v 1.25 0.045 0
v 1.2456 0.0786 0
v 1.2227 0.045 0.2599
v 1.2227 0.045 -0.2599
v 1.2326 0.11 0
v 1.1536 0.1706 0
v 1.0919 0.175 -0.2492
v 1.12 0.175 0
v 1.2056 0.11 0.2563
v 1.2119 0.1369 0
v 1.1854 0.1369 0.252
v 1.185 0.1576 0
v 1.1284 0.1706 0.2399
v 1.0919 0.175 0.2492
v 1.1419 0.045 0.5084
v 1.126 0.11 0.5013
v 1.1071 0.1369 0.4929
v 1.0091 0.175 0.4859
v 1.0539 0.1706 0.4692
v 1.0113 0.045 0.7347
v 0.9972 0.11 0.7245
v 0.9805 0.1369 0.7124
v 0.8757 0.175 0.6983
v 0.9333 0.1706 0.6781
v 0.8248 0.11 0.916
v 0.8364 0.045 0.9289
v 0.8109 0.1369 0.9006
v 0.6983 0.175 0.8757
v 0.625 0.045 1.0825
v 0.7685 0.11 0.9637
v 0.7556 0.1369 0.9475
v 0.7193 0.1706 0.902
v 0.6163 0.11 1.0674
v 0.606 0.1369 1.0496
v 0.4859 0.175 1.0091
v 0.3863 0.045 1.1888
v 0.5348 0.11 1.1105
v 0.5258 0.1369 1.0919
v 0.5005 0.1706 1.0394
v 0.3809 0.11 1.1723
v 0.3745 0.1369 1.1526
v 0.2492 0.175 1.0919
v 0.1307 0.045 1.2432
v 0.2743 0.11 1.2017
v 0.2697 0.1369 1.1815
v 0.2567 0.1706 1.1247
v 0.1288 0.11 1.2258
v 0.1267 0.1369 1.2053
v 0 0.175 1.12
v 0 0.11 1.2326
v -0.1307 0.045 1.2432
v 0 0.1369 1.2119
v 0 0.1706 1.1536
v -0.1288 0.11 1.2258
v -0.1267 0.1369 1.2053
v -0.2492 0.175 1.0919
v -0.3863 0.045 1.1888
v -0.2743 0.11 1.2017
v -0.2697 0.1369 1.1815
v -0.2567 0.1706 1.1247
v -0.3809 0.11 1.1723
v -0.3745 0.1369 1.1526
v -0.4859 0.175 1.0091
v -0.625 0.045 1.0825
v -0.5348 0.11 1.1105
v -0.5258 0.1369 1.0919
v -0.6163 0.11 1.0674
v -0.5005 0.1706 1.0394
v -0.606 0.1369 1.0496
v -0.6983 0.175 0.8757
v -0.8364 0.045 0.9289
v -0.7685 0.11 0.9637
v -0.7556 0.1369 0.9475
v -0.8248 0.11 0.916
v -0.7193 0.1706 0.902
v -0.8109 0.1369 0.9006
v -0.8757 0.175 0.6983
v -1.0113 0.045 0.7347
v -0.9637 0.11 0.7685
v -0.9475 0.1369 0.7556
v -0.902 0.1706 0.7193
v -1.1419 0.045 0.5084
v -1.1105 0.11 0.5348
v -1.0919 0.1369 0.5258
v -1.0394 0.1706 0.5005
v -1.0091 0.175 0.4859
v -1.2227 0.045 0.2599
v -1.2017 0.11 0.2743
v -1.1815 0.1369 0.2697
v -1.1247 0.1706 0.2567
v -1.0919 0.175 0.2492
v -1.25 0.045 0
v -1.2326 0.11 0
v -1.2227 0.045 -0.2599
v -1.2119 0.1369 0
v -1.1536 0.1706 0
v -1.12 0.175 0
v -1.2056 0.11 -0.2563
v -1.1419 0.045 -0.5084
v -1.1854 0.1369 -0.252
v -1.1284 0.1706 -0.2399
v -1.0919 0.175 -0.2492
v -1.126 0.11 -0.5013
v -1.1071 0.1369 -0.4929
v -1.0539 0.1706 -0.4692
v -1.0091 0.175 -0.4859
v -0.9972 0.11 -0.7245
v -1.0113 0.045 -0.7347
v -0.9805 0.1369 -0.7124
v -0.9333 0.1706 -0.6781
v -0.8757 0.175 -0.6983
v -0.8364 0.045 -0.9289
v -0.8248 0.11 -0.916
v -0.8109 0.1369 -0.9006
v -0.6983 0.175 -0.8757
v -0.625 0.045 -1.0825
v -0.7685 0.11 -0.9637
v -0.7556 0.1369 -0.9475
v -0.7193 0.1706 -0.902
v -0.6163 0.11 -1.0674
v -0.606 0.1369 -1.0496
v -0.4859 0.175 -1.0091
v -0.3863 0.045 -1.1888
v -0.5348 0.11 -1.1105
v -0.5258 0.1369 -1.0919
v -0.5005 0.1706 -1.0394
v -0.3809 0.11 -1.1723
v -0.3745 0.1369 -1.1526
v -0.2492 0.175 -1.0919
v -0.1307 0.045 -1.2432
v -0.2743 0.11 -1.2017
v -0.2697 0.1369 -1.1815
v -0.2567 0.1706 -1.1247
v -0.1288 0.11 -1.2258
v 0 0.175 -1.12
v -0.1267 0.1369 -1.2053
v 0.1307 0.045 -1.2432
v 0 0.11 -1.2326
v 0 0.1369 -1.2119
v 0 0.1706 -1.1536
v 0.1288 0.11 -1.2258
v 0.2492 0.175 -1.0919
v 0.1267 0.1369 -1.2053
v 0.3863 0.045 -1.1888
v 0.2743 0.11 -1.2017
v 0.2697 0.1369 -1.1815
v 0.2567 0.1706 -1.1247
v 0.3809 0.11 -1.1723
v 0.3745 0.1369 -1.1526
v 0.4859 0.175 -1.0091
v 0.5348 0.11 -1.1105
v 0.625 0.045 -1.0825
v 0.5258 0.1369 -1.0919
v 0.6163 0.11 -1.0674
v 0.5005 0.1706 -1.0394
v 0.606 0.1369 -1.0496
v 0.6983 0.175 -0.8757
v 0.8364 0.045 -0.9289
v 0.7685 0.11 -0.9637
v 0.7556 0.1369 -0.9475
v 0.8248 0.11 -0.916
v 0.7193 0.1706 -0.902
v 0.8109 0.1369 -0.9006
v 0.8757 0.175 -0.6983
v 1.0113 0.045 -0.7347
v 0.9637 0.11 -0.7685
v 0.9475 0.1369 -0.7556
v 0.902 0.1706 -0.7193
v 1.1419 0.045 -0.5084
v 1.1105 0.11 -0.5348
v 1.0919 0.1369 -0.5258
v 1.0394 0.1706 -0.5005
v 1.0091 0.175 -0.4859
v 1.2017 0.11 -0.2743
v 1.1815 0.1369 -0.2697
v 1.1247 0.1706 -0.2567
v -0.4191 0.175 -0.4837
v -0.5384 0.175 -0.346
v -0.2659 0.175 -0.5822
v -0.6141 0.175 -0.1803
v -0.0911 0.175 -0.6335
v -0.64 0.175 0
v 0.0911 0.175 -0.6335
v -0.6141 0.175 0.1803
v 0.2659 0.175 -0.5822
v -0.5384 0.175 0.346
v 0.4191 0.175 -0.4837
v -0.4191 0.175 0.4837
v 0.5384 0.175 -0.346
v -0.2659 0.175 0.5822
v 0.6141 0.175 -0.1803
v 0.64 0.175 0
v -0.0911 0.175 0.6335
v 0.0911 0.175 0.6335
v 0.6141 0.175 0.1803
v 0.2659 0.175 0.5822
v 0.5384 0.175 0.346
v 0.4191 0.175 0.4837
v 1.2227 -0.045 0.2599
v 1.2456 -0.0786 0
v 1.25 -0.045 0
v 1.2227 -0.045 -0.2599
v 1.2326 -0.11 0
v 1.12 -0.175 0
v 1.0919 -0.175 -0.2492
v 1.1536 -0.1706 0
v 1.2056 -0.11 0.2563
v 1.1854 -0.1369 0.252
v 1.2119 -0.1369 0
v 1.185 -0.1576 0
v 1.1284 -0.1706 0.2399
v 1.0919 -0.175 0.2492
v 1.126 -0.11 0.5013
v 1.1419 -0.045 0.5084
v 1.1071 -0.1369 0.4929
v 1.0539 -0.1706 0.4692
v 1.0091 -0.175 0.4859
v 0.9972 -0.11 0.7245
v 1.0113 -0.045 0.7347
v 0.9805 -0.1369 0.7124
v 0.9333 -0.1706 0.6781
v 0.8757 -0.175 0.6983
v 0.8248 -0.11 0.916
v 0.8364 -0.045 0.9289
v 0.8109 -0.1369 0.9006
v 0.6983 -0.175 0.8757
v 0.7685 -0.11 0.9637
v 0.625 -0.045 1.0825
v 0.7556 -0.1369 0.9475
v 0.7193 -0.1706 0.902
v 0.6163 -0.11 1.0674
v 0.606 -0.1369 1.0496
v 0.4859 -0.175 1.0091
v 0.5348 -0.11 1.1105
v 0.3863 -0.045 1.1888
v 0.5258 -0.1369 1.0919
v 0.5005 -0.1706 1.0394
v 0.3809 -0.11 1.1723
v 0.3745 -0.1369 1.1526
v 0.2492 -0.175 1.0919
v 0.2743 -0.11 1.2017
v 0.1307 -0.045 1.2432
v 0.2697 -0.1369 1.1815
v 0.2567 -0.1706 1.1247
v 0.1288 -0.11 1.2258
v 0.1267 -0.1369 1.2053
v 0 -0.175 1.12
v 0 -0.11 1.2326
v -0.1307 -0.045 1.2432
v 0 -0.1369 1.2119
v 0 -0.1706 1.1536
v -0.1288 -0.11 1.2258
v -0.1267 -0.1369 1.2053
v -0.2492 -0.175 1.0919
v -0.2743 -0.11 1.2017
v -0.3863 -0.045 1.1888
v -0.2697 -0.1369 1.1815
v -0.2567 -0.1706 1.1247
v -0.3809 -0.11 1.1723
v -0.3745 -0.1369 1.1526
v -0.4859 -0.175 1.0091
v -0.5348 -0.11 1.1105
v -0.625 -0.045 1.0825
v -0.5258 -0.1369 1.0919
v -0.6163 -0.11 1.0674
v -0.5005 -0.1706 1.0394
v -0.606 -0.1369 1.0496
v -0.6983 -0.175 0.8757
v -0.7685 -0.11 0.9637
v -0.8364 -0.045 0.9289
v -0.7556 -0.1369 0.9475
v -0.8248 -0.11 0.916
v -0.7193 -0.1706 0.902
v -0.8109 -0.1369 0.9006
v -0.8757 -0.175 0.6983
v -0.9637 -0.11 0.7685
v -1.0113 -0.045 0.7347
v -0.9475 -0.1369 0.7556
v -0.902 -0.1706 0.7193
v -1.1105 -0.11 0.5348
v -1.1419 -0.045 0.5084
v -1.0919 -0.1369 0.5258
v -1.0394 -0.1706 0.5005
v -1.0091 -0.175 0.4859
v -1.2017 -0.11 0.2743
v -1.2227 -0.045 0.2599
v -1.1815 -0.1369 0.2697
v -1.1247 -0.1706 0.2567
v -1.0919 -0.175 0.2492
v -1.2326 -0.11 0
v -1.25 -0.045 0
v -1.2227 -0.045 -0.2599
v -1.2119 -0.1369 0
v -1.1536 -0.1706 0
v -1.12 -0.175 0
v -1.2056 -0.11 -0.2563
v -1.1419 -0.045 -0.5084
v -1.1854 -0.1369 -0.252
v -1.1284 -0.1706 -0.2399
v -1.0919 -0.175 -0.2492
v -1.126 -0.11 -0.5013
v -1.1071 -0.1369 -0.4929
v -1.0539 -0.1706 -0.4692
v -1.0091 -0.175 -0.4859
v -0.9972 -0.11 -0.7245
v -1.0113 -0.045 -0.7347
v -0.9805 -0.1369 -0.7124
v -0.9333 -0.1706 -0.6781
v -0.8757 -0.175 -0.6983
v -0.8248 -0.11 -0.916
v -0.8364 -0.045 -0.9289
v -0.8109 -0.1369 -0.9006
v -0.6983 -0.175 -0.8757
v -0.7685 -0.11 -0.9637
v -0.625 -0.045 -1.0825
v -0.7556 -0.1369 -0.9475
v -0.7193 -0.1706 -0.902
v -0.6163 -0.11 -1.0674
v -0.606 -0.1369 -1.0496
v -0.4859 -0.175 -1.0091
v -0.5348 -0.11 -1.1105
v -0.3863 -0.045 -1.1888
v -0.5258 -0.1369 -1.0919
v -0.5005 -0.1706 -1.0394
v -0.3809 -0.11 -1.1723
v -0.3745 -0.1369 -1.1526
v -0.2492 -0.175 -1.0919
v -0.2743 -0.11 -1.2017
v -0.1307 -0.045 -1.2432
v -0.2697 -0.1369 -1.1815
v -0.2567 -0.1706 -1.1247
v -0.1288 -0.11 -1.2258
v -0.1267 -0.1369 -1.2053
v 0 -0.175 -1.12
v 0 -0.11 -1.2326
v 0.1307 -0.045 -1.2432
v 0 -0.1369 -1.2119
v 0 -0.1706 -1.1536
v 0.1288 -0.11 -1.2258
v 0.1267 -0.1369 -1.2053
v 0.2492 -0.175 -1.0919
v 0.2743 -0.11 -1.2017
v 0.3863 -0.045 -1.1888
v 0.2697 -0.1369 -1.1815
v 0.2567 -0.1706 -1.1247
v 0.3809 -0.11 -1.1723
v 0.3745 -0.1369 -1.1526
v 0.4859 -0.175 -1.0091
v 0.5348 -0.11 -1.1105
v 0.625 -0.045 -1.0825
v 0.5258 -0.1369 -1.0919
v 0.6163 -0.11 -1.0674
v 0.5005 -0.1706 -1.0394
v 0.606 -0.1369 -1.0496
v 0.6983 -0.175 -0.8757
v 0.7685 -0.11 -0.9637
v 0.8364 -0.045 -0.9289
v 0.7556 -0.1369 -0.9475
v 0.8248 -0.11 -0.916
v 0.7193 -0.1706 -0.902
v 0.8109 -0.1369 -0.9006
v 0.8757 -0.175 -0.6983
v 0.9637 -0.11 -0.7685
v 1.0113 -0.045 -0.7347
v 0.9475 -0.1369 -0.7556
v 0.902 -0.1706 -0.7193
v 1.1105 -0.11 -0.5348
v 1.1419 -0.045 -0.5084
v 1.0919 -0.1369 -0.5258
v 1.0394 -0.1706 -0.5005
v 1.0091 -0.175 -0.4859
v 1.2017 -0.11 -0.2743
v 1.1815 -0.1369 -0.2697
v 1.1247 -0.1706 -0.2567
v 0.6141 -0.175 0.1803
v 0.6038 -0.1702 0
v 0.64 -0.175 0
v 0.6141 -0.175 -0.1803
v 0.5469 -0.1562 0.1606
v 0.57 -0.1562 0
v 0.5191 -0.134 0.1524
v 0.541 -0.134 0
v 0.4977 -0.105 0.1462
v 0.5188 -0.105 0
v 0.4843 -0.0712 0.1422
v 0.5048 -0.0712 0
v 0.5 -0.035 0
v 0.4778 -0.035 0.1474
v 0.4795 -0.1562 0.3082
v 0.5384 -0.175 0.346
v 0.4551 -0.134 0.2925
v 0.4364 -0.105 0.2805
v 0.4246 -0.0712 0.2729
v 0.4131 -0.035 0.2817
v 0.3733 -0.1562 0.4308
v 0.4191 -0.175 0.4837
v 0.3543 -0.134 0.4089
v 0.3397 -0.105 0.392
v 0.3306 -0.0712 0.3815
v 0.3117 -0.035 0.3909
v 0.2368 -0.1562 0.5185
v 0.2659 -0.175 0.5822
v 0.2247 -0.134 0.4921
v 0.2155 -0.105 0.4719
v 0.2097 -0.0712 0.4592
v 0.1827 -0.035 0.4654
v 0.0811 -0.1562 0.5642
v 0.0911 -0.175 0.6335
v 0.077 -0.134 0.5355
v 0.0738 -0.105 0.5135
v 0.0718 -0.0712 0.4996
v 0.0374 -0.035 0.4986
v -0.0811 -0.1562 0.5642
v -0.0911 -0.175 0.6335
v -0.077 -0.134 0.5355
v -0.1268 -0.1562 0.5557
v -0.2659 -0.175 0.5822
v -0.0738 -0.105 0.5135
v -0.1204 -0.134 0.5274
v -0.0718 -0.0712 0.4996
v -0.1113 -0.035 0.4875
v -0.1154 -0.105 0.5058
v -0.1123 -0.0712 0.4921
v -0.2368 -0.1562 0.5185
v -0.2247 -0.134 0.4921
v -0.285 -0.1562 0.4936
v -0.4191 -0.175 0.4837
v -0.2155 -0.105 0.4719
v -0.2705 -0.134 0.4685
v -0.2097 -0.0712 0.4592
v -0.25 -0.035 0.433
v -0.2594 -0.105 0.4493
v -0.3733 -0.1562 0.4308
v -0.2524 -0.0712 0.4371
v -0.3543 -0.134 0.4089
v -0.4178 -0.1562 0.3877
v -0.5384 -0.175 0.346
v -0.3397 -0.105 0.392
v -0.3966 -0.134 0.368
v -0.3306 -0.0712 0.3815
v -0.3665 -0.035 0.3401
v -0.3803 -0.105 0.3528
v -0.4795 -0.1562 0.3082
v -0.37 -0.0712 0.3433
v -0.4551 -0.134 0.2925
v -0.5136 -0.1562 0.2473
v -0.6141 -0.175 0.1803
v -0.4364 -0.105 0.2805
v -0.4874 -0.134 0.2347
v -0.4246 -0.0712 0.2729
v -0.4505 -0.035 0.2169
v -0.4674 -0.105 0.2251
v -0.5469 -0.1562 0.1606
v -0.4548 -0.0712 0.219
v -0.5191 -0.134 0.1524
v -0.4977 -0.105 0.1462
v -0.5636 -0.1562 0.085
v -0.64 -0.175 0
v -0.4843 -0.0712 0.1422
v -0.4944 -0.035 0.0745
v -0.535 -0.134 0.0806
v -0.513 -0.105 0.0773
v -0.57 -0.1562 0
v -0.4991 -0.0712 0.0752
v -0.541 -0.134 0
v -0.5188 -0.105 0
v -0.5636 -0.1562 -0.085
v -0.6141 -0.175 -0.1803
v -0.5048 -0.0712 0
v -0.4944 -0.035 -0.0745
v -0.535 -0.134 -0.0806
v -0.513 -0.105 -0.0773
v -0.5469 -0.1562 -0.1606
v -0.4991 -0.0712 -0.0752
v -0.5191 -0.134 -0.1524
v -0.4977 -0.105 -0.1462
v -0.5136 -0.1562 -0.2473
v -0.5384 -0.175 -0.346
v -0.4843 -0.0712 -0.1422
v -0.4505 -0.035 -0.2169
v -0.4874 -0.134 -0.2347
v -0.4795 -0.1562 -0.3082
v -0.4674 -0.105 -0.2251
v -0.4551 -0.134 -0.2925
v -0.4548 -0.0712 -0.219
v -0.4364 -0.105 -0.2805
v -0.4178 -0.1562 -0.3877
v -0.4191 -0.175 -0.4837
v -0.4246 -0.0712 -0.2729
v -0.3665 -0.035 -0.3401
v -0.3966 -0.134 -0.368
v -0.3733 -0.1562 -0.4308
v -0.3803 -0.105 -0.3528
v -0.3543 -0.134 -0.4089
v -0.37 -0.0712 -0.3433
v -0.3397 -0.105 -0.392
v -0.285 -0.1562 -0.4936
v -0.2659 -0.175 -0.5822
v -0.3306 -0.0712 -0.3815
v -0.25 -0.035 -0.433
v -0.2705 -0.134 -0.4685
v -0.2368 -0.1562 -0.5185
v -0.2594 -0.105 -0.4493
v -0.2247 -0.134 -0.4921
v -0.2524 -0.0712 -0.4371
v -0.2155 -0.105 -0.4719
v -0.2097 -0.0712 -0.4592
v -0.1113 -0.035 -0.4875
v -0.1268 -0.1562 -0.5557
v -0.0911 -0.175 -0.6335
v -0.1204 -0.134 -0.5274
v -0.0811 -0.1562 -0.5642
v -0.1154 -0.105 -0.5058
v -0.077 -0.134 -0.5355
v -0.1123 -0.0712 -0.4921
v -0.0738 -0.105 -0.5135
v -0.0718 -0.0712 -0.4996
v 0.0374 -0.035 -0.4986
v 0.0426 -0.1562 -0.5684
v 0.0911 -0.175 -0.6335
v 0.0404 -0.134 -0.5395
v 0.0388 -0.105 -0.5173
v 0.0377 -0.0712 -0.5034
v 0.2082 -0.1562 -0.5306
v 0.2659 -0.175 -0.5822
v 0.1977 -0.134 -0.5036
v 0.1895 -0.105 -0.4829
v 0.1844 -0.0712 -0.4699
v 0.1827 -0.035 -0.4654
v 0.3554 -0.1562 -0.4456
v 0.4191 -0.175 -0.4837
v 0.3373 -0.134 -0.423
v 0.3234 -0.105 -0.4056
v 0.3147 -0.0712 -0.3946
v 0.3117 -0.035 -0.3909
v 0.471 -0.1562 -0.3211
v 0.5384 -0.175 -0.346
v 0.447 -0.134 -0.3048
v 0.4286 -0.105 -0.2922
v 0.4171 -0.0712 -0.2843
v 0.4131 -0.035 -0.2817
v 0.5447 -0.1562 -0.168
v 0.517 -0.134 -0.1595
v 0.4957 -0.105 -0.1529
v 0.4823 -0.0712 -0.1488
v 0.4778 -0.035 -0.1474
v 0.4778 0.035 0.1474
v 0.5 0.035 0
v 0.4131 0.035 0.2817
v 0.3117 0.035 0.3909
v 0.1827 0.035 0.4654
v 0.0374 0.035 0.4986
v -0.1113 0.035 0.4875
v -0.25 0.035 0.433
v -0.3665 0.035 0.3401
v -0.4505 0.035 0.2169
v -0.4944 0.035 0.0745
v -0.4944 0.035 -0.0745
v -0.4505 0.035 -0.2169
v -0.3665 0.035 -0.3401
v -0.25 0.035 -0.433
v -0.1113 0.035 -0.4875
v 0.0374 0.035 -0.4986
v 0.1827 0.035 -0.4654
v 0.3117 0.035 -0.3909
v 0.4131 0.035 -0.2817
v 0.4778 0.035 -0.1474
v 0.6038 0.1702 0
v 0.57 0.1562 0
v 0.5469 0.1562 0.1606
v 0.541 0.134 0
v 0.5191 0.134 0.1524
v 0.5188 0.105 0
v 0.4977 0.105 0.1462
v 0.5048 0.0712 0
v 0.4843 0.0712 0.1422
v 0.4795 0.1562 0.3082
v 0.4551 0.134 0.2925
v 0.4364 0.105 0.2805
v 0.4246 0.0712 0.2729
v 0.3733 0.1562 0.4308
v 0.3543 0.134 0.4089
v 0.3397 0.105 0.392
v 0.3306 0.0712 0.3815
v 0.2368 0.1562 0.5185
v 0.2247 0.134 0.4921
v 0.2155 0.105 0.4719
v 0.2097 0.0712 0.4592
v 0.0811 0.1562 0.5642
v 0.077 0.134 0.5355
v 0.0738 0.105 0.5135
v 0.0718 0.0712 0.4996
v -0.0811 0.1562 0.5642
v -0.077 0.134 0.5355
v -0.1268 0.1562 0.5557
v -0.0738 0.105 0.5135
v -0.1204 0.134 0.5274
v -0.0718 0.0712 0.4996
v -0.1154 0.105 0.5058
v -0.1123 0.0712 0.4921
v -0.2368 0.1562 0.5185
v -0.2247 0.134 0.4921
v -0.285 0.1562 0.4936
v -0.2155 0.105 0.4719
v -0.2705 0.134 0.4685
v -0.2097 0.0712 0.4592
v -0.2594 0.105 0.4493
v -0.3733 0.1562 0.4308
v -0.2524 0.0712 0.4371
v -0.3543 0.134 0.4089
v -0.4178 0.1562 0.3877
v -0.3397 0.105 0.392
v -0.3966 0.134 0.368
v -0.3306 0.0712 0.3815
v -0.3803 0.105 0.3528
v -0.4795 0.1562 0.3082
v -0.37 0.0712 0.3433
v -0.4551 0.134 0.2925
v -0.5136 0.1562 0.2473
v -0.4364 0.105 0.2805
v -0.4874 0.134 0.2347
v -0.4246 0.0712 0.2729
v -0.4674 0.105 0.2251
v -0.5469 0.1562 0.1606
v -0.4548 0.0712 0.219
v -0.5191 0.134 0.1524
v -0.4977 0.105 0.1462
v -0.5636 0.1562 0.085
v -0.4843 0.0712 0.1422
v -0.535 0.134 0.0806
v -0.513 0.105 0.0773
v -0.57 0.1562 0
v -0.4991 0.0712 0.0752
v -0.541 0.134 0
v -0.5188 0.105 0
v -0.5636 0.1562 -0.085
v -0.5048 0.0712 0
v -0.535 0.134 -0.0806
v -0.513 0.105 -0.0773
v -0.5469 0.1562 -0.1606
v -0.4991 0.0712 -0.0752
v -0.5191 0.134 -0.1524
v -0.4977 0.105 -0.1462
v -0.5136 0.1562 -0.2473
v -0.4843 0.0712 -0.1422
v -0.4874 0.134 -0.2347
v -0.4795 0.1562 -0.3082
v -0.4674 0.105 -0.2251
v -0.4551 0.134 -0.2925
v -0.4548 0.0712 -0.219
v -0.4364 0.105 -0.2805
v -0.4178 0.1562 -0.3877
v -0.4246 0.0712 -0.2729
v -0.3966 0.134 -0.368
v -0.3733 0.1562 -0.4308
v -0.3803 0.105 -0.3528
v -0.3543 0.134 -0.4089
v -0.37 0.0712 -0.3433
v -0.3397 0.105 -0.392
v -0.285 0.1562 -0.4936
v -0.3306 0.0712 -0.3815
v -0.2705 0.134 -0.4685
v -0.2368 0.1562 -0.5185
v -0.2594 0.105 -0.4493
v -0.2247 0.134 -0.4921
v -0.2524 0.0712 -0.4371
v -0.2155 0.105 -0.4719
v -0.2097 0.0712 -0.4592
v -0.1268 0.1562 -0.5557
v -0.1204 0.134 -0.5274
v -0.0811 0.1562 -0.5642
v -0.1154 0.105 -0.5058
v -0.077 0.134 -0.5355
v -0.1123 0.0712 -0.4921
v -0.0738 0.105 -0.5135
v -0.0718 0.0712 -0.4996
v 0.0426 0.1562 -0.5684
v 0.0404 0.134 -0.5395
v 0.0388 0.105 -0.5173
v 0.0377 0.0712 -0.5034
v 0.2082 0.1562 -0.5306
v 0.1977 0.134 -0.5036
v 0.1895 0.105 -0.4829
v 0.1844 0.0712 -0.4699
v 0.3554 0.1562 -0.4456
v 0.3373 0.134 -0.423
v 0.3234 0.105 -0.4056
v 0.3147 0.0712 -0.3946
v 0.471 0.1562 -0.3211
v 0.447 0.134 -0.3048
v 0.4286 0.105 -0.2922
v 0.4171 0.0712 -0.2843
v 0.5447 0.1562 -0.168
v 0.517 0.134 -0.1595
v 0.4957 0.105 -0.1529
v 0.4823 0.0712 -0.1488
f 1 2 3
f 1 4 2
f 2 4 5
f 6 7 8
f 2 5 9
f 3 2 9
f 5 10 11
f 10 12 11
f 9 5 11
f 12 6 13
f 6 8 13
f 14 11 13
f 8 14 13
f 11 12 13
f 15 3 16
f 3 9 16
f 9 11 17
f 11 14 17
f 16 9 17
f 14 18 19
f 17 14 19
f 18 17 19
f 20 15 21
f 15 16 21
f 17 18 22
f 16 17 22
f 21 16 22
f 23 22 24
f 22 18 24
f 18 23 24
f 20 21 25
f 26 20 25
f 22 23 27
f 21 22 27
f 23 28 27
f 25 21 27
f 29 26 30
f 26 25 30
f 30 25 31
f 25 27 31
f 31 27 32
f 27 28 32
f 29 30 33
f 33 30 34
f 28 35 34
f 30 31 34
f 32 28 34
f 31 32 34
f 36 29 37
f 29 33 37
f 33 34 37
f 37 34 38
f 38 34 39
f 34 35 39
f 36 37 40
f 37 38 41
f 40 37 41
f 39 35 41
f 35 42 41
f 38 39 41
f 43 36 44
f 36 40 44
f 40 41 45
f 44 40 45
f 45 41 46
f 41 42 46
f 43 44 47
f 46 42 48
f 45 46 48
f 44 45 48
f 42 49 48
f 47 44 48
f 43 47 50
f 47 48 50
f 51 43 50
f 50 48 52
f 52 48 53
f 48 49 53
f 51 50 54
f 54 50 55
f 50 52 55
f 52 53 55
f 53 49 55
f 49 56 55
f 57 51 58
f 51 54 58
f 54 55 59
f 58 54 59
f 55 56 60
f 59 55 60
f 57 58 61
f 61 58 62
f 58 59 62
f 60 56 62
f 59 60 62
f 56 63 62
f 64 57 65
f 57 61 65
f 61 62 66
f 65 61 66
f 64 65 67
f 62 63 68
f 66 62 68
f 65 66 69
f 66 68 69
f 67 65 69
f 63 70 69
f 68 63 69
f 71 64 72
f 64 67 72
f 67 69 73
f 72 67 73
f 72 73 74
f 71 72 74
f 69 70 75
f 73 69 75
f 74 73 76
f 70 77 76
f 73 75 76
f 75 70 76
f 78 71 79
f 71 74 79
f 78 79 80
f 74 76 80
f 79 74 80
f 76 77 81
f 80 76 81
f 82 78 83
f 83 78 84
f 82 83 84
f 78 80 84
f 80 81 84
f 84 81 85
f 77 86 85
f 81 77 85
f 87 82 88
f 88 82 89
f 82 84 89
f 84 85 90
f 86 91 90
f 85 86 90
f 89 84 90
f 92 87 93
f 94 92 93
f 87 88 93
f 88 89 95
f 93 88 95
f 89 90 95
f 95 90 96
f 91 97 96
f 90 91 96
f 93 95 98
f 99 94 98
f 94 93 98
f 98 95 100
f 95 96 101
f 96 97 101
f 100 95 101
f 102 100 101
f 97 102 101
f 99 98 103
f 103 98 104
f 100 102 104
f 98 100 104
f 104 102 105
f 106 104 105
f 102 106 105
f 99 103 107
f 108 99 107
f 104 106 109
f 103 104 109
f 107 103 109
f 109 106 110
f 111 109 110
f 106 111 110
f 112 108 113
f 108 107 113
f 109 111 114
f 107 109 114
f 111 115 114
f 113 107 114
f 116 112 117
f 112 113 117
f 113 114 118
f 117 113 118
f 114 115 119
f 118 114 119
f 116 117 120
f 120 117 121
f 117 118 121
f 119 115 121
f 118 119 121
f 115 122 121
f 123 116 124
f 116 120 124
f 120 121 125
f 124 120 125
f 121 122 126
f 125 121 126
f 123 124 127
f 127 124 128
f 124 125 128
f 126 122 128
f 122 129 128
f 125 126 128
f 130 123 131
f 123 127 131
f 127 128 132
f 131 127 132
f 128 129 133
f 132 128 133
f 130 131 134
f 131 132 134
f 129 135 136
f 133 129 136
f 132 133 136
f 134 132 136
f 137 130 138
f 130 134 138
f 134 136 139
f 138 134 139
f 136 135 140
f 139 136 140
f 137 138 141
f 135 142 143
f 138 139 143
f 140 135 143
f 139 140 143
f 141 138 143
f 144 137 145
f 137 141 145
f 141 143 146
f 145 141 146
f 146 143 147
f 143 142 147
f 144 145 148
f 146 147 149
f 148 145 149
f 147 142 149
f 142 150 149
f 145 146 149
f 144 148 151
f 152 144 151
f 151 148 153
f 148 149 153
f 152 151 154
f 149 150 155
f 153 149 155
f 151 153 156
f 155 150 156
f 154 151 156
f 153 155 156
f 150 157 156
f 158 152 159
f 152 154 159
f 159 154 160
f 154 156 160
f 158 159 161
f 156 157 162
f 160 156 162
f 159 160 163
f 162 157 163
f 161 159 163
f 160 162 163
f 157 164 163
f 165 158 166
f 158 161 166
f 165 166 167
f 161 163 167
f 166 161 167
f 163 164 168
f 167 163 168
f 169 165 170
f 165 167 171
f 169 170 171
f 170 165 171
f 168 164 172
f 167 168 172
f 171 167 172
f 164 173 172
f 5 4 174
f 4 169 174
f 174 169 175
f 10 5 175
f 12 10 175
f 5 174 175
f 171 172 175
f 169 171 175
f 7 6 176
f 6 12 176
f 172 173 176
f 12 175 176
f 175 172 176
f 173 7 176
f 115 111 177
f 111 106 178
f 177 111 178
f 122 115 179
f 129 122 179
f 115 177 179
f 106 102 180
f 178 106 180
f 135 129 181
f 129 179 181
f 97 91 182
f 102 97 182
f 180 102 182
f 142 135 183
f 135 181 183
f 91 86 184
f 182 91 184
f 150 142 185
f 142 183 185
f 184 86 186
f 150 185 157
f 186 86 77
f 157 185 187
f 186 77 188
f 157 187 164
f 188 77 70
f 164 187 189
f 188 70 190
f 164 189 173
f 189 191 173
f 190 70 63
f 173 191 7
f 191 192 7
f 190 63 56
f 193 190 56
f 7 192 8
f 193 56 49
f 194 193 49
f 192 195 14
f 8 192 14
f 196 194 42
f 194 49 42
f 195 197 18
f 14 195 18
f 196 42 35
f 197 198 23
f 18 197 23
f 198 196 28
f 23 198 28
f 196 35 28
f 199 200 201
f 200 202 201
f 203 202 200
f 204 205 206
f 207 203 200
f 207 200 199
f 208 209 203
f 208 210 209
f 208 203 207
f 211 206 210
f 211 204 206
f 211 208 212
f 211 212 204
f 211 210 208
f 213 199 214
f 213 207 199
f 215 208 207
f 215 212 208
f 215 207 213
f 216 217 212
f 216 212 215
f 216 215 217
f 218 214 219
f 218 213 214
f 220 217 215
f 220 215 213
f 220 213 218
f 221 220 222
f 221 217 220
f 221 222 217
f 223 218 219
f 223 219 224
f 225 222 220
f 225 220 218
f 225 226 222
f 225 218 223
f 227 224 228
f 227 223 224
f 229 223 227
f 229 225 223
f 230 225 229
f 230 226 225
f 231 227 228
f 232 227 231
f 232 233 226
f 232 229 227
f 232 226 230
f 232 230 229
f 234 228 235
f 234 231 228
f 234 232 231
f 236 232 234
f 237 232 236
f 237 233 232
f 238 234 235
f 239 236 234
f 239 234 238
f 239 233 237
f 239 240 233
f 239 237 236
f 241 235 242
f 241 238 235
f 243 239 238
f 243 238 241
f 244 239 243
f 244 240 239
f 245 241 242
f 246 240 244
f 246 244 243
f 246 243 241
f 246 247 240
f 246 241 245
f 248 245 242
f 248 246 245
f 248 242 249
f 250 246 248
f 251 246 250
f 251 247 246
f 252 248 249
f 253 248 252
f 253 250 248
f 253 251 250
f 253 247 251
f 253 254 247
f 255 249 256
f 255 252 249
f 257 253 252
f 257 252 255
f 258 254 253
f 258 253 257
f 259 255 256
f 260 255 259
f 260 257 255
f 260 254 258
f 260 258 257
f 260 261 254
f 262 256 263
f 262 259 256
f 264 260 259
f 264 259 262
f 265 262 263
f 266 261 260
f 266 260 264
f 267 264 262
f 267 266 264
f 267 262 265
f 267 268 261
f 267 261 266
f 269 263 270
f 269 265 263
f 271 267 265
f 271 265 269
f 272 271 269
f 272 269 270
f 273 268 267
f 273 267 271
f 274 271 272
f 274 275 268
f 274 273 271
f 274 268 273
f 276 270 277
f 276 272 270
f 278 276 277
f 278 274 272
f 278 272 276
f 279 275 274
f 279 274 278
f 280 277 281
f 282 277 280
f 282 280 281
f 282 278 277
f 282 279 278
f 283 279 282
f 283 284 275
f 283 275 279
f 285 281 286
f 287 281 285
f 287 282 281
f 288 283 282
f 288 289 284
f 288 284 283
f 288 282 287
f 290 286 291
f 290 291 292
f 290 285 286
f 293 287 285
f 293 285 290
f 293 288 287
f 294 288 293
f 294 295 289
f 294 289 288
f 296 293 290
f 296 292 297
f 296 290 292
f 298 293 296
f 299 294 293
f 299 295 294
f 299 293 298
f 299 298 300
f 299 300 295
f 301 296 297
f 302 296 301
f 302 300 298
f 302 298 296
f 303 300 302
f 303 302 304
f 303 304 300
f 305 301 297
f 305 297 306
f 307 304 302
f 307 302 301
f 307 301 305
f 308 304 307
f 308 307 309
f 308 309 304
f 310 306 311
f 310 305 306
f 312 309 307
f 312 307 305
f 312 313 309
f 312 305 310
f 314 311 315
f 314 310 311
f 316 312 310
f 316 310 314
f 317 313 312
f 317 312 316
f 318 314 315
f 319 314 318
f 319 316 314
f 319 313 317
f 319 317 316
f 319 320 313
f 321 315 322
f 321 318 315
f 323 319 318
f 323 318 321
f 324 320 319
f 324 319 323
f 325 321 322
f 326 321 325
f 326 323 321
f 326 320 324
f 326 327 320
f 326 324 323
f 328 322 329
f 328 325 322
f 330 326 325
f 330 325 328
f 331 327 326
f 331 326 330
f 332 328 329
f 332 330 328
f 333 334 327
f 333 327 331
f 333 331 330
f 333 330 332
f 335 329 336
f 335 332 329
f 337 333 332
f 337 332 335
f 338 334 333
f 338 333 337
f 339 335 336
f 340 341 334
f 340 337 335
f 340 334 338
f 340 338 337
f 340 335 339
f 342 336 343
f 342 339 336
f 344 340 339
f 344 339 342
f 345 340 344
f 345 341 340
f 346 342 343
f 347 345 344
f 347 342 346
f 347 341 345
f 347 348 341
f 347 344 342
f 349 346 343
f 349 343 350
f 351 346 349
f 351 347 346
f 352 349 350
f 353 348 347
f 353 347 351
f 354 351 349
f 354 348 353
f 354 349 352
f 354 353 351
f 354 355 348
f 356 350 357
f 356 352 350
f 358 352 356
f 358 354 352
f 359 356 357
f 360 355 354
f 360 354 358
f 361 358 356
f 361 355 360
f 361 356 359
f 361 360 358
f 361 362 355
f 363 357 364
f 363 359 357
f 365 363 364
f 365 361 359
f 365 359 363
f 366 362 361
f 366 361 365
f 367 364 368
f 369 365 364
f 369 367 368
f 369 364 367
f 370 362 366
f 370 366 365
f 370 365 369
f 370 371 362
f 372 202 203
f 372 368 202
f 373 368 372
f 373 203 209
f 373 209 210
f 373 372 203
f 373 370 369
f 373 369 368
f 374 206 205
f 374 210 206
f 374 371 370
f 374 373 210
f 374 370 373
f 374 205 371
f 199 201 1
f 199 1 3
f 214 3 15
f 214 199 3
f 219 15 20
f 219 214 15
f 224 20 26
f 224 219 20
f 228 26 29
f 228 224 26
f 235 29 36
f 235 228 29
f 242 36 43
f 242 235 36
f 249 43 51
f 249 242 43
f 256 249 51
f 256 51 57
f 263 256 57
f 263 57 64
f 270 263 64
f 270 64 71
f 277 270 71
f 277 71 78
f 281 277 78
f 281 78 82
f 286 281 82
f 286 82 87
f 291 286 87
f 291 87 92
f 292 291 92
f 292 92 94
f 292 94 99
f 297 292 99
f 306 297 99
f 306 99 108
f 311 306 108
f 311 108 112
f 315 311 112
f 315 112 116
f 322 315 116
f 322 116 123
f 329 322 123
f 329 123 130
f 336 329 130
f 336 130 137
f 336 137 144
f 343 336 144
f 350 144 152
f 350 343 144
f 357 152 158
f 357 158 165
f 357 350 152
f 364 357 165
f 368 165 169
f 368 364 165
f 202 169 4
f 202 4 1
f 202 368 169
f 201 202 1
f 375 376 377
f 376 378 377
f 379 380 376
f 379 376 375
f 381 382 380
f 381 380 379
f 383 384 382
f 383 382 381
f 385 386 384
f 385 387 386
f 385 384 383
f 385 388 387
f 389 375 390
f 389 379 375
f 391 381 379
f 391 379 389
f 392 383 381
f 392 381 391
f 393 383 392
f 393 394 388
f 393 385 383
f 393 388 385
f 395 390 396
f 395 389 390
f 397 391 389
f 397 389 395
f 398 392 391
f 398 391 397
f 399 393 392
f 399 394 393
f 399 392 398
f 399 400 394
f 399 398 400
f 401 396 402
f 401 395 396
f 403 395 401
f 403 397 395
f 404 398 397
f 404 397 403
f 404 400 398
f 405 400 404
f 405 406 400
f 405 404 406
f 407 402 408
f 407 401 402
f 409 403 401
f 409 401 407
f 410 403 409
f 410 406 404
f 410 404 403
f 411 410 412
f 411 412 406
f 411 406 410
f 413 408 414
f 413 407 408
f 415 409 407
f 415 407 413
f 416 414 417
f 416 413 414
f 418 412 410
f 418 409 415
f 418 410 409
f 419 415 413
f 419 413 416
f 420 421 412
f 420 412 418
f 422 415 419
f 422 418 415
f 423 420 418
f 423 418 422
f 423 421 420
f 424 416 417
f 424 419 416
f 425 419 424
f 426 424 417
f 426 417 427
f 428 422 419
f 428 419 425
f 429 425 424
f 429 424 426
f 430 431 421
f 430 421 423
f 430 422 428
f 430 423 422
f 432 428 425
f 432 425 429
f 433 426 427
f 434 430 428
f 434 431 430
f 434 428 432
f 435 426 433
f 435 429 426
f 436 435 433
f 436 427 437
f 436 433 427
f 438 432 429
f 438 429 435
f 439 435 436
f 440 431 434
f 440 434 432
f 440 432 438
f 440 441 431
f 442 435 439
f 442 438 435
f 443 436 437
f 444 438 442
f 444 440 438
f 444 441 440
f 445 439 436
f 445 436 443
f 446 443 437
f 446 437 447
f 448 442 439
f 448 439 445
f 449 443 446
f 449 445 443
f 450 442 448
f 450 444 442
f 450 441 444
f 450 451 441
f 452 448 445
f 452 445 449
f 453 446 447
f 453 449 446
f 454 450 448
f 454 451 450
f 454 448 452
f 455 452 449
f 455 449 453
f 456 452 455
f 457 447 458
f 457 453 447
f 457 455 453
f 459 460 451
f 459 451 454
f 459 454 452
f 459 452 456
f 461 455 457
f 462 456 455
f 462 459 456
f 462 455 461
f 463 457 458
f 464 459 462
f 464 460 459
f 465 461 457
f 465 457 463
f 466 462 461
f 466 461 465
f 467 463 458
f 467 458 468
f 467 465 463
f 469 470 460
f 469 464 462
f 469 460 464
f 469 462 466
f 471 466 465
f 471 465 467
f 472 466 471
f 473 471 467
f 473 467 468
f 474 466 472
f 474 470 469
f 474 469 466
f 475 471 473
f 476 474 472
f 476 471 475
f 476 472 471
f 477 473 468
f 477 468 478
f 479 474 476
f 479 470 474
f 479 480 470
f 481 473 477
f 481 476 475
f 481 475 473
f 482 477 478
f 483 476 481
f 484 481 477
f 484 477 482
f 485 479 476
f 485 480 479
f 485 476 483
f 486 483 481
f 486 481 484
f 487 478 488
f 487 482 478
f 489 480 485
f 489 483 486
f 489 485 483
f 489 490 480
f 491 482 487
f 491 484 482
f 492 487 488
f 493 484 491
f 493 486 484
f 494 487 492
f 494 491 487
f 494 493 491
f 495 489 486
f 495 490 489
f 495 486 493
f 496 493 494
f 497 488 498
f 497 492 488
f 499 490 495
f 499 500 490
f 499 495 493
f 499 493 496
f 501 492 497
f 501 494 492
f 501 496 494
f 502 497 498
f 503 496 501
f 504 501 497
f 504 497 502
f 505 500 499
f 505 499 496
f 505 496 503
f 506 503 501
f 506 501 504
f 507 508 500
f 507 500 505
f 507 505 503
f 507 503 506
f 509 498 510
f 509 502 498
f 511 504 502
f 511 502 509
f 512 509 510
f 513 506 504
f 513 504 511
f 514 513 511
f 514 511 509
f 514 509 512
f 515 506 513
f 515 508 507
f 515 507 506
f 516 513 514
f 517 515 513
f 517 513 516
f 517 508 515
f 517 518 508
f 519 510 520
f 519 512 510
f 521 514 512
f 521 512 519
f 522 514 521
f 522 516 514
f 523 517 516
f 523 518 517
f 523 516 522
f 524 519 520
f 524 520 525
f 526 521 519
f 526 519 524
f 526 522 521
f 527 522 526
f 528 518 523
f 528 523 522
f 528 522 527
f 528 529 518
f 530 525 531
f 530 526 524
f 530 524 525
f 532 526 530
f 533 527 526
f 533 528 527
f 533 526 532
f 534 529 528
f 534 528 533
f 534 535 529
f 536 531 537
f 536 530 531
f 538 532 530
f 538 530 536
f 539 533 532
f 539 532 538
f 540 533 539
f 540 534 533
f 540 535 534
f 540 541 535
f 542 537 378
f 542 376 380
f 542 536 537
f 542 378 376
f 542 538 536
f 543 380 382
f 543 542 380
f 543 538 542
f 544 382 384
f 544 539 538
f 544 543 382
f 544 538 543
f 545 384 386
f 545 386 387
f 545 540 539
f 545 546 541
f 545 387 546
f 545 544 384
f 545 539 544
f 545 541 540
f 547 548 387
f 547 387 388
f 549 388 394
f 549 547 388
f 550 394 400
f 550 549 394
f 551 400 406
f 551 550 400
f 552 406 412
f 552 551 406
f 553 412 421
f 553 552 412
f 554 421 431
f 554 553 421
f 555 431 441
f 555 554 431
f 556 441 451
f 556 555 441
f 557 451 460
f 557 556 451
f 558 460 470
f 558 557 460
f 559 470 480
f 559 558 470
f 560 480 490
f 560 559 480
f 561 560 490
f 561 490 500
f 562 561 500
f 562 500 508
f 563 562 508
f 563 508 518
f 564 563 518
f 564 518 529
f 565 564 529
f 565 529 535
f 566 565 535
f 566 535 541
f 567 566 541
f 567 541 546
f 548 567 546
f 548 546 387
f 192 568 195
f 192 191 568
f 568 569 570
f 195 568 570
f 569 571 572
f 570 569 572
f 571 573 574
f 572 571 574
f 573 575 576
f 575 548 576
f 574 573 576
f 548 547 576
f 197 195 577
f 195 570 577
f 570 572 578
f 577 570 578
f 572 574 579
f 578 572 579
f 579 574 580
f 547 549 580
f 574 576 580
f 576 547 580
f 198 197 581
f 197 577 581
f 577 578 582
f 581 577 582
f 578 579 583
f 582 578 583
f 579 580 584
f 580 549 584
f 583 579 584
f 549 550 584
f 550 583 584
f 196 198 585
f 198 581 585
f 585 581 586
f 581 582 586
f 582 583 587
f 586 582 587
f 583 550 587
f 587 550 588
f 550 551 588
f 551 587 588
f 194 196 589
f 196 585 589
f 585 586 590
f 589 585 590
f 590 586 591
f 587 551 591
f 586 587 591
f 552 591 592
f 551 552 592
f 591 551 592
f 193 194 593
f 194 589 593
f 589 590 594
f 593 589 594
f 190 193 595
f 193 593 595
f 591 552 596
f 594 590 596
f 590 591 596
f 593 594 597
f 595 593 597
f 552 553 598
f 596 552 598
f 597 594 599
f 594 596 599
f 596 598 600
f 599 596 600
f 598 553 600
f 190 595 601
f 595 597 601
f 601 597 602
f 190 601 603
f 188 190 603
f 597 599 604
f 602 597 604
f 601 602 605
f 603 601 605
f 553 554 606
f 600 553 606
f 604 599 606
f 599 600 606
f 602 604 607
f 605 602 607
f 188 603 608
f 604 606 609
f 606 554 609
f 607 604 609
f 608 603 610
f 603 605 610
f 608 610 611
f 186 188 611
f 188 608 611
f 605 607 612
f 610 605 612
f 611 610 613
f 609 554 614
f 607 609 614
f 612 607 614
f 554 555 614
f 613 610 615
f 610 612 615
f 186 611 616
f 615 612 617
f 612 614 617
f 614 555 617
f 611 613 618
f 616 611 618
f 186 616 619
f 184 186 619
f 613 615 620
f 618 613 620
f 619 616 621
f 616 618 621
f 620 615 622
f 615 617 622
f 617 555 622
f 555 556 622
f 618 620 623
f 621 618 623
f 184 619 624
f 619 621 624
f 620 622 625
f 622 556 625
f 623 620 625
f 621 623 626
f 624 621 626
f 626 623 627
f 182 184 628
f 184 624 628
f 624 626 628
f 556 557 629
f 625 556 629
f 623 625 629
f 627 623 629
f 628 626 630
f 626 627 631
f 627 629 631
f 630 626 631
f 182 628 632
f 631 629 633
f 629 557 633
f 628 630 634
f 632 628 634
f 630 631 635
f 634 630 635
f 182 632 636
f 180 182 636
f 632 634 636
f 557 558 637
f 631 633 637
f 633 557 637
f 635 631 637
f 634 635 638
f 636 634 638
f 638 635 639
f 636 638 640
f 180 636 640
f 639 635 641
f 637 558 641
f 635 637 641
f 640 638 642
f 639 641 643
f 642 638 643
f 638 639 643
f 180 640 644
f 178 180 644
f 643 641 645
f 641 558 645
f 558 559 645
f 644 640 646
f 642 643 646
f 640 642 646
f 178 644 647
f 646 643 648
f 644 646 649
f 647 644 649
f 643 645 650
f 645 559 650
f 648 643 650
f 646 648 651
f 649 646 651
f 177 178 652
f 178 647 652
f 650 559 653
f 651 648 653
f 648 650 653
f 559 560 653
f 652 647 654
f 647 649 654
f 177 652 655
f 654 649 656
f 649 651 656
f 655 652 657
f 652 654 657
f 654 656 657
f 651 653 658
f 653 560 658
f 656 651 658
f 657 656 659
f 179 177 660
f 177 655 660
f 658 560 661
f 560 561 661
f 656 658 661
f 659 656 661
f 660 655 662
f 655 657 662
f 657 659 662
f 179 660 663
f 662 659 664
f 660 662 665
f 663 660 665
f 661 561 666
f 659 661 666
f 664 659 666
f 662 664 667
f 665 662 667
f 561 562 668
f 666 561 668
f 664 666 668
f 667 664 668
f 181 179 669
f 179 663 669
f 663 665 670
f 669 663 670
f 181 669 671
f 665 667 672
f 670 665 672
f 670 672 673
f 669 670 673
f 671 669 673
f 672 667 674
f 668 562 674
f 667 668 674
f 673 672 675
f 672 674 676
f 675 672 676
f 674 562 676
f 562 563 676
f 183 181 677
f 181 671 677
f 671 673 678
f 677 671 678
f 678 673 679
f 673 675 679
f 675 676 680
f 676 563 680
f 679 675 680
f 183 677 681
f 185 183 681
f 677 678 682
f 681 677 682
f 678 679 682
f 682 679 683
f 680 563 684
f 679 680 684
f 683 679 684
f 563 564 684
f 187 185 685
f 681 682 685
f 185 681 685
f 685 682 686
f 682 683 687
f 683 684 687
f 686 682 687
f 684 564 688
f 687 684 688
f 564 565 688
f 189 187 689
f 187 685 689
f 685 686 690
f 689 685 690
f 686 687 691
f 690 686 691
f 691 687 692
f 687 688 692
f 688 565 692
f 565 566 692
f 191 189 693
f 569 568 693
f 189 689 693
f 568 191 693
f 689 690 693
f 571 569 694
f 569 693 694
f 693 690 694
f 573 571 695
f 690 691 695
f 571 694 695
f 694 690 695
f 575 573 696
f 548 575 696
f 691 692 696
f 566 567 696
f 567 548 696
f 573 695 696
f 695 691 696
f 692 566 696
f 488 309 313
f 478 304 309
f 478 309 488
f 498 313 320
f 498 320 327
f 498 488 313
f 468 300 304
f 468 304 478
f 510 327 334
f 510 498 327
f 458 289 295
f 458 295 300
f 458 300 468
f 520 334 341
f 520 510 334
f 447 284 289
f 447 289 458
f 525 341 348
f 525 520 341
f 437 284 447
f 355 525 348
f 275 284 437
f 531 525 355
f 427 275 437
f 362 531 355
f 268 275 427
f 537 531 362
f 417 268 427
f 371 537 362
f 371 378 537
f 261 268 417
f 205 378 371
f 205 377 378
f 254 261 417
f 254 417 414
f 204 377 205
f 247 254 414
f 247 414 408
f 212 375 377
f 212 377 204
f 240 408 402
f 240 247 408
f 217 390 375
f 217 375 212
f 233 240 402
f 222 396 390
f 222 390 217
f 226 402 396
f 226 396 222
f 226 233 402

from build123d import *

# Parameters (mm, degrees)
F0_R     = 1.25
F0_R_2   = 0.5
F1_DEPTH = 0.175
F2_R     = 0.13
F3_R     = 0.14


with BuildPart() as f1:
    # F0 (on Front) → F1 (new body, symmetric)
    with BuildSketch(Plane.XZ):
        Circle(F0_R)
        Circle(F0_R_2, mode=Mode.SUBTRACT)
    extrude(amount=F1_DEPTH, both=True)

    # F2
    f2_edges = [f1.edges().sort_by_distance(p)[0] for p in [
        (-1.25, -0.175, 0),
        (-1.25, 0.175, 0),
    ]]
    fillet(f2_edges, radius=F2_R)

    # F3
    f3_edges = [f1.edges().sort_by_distance(p)[0] for p in [
        (-0.5, -0.175, 0),
        (-0.5, 0.175, 0),
    ]]
    fillet(f3_edges, radius=F3_R)


solid = f1.part
